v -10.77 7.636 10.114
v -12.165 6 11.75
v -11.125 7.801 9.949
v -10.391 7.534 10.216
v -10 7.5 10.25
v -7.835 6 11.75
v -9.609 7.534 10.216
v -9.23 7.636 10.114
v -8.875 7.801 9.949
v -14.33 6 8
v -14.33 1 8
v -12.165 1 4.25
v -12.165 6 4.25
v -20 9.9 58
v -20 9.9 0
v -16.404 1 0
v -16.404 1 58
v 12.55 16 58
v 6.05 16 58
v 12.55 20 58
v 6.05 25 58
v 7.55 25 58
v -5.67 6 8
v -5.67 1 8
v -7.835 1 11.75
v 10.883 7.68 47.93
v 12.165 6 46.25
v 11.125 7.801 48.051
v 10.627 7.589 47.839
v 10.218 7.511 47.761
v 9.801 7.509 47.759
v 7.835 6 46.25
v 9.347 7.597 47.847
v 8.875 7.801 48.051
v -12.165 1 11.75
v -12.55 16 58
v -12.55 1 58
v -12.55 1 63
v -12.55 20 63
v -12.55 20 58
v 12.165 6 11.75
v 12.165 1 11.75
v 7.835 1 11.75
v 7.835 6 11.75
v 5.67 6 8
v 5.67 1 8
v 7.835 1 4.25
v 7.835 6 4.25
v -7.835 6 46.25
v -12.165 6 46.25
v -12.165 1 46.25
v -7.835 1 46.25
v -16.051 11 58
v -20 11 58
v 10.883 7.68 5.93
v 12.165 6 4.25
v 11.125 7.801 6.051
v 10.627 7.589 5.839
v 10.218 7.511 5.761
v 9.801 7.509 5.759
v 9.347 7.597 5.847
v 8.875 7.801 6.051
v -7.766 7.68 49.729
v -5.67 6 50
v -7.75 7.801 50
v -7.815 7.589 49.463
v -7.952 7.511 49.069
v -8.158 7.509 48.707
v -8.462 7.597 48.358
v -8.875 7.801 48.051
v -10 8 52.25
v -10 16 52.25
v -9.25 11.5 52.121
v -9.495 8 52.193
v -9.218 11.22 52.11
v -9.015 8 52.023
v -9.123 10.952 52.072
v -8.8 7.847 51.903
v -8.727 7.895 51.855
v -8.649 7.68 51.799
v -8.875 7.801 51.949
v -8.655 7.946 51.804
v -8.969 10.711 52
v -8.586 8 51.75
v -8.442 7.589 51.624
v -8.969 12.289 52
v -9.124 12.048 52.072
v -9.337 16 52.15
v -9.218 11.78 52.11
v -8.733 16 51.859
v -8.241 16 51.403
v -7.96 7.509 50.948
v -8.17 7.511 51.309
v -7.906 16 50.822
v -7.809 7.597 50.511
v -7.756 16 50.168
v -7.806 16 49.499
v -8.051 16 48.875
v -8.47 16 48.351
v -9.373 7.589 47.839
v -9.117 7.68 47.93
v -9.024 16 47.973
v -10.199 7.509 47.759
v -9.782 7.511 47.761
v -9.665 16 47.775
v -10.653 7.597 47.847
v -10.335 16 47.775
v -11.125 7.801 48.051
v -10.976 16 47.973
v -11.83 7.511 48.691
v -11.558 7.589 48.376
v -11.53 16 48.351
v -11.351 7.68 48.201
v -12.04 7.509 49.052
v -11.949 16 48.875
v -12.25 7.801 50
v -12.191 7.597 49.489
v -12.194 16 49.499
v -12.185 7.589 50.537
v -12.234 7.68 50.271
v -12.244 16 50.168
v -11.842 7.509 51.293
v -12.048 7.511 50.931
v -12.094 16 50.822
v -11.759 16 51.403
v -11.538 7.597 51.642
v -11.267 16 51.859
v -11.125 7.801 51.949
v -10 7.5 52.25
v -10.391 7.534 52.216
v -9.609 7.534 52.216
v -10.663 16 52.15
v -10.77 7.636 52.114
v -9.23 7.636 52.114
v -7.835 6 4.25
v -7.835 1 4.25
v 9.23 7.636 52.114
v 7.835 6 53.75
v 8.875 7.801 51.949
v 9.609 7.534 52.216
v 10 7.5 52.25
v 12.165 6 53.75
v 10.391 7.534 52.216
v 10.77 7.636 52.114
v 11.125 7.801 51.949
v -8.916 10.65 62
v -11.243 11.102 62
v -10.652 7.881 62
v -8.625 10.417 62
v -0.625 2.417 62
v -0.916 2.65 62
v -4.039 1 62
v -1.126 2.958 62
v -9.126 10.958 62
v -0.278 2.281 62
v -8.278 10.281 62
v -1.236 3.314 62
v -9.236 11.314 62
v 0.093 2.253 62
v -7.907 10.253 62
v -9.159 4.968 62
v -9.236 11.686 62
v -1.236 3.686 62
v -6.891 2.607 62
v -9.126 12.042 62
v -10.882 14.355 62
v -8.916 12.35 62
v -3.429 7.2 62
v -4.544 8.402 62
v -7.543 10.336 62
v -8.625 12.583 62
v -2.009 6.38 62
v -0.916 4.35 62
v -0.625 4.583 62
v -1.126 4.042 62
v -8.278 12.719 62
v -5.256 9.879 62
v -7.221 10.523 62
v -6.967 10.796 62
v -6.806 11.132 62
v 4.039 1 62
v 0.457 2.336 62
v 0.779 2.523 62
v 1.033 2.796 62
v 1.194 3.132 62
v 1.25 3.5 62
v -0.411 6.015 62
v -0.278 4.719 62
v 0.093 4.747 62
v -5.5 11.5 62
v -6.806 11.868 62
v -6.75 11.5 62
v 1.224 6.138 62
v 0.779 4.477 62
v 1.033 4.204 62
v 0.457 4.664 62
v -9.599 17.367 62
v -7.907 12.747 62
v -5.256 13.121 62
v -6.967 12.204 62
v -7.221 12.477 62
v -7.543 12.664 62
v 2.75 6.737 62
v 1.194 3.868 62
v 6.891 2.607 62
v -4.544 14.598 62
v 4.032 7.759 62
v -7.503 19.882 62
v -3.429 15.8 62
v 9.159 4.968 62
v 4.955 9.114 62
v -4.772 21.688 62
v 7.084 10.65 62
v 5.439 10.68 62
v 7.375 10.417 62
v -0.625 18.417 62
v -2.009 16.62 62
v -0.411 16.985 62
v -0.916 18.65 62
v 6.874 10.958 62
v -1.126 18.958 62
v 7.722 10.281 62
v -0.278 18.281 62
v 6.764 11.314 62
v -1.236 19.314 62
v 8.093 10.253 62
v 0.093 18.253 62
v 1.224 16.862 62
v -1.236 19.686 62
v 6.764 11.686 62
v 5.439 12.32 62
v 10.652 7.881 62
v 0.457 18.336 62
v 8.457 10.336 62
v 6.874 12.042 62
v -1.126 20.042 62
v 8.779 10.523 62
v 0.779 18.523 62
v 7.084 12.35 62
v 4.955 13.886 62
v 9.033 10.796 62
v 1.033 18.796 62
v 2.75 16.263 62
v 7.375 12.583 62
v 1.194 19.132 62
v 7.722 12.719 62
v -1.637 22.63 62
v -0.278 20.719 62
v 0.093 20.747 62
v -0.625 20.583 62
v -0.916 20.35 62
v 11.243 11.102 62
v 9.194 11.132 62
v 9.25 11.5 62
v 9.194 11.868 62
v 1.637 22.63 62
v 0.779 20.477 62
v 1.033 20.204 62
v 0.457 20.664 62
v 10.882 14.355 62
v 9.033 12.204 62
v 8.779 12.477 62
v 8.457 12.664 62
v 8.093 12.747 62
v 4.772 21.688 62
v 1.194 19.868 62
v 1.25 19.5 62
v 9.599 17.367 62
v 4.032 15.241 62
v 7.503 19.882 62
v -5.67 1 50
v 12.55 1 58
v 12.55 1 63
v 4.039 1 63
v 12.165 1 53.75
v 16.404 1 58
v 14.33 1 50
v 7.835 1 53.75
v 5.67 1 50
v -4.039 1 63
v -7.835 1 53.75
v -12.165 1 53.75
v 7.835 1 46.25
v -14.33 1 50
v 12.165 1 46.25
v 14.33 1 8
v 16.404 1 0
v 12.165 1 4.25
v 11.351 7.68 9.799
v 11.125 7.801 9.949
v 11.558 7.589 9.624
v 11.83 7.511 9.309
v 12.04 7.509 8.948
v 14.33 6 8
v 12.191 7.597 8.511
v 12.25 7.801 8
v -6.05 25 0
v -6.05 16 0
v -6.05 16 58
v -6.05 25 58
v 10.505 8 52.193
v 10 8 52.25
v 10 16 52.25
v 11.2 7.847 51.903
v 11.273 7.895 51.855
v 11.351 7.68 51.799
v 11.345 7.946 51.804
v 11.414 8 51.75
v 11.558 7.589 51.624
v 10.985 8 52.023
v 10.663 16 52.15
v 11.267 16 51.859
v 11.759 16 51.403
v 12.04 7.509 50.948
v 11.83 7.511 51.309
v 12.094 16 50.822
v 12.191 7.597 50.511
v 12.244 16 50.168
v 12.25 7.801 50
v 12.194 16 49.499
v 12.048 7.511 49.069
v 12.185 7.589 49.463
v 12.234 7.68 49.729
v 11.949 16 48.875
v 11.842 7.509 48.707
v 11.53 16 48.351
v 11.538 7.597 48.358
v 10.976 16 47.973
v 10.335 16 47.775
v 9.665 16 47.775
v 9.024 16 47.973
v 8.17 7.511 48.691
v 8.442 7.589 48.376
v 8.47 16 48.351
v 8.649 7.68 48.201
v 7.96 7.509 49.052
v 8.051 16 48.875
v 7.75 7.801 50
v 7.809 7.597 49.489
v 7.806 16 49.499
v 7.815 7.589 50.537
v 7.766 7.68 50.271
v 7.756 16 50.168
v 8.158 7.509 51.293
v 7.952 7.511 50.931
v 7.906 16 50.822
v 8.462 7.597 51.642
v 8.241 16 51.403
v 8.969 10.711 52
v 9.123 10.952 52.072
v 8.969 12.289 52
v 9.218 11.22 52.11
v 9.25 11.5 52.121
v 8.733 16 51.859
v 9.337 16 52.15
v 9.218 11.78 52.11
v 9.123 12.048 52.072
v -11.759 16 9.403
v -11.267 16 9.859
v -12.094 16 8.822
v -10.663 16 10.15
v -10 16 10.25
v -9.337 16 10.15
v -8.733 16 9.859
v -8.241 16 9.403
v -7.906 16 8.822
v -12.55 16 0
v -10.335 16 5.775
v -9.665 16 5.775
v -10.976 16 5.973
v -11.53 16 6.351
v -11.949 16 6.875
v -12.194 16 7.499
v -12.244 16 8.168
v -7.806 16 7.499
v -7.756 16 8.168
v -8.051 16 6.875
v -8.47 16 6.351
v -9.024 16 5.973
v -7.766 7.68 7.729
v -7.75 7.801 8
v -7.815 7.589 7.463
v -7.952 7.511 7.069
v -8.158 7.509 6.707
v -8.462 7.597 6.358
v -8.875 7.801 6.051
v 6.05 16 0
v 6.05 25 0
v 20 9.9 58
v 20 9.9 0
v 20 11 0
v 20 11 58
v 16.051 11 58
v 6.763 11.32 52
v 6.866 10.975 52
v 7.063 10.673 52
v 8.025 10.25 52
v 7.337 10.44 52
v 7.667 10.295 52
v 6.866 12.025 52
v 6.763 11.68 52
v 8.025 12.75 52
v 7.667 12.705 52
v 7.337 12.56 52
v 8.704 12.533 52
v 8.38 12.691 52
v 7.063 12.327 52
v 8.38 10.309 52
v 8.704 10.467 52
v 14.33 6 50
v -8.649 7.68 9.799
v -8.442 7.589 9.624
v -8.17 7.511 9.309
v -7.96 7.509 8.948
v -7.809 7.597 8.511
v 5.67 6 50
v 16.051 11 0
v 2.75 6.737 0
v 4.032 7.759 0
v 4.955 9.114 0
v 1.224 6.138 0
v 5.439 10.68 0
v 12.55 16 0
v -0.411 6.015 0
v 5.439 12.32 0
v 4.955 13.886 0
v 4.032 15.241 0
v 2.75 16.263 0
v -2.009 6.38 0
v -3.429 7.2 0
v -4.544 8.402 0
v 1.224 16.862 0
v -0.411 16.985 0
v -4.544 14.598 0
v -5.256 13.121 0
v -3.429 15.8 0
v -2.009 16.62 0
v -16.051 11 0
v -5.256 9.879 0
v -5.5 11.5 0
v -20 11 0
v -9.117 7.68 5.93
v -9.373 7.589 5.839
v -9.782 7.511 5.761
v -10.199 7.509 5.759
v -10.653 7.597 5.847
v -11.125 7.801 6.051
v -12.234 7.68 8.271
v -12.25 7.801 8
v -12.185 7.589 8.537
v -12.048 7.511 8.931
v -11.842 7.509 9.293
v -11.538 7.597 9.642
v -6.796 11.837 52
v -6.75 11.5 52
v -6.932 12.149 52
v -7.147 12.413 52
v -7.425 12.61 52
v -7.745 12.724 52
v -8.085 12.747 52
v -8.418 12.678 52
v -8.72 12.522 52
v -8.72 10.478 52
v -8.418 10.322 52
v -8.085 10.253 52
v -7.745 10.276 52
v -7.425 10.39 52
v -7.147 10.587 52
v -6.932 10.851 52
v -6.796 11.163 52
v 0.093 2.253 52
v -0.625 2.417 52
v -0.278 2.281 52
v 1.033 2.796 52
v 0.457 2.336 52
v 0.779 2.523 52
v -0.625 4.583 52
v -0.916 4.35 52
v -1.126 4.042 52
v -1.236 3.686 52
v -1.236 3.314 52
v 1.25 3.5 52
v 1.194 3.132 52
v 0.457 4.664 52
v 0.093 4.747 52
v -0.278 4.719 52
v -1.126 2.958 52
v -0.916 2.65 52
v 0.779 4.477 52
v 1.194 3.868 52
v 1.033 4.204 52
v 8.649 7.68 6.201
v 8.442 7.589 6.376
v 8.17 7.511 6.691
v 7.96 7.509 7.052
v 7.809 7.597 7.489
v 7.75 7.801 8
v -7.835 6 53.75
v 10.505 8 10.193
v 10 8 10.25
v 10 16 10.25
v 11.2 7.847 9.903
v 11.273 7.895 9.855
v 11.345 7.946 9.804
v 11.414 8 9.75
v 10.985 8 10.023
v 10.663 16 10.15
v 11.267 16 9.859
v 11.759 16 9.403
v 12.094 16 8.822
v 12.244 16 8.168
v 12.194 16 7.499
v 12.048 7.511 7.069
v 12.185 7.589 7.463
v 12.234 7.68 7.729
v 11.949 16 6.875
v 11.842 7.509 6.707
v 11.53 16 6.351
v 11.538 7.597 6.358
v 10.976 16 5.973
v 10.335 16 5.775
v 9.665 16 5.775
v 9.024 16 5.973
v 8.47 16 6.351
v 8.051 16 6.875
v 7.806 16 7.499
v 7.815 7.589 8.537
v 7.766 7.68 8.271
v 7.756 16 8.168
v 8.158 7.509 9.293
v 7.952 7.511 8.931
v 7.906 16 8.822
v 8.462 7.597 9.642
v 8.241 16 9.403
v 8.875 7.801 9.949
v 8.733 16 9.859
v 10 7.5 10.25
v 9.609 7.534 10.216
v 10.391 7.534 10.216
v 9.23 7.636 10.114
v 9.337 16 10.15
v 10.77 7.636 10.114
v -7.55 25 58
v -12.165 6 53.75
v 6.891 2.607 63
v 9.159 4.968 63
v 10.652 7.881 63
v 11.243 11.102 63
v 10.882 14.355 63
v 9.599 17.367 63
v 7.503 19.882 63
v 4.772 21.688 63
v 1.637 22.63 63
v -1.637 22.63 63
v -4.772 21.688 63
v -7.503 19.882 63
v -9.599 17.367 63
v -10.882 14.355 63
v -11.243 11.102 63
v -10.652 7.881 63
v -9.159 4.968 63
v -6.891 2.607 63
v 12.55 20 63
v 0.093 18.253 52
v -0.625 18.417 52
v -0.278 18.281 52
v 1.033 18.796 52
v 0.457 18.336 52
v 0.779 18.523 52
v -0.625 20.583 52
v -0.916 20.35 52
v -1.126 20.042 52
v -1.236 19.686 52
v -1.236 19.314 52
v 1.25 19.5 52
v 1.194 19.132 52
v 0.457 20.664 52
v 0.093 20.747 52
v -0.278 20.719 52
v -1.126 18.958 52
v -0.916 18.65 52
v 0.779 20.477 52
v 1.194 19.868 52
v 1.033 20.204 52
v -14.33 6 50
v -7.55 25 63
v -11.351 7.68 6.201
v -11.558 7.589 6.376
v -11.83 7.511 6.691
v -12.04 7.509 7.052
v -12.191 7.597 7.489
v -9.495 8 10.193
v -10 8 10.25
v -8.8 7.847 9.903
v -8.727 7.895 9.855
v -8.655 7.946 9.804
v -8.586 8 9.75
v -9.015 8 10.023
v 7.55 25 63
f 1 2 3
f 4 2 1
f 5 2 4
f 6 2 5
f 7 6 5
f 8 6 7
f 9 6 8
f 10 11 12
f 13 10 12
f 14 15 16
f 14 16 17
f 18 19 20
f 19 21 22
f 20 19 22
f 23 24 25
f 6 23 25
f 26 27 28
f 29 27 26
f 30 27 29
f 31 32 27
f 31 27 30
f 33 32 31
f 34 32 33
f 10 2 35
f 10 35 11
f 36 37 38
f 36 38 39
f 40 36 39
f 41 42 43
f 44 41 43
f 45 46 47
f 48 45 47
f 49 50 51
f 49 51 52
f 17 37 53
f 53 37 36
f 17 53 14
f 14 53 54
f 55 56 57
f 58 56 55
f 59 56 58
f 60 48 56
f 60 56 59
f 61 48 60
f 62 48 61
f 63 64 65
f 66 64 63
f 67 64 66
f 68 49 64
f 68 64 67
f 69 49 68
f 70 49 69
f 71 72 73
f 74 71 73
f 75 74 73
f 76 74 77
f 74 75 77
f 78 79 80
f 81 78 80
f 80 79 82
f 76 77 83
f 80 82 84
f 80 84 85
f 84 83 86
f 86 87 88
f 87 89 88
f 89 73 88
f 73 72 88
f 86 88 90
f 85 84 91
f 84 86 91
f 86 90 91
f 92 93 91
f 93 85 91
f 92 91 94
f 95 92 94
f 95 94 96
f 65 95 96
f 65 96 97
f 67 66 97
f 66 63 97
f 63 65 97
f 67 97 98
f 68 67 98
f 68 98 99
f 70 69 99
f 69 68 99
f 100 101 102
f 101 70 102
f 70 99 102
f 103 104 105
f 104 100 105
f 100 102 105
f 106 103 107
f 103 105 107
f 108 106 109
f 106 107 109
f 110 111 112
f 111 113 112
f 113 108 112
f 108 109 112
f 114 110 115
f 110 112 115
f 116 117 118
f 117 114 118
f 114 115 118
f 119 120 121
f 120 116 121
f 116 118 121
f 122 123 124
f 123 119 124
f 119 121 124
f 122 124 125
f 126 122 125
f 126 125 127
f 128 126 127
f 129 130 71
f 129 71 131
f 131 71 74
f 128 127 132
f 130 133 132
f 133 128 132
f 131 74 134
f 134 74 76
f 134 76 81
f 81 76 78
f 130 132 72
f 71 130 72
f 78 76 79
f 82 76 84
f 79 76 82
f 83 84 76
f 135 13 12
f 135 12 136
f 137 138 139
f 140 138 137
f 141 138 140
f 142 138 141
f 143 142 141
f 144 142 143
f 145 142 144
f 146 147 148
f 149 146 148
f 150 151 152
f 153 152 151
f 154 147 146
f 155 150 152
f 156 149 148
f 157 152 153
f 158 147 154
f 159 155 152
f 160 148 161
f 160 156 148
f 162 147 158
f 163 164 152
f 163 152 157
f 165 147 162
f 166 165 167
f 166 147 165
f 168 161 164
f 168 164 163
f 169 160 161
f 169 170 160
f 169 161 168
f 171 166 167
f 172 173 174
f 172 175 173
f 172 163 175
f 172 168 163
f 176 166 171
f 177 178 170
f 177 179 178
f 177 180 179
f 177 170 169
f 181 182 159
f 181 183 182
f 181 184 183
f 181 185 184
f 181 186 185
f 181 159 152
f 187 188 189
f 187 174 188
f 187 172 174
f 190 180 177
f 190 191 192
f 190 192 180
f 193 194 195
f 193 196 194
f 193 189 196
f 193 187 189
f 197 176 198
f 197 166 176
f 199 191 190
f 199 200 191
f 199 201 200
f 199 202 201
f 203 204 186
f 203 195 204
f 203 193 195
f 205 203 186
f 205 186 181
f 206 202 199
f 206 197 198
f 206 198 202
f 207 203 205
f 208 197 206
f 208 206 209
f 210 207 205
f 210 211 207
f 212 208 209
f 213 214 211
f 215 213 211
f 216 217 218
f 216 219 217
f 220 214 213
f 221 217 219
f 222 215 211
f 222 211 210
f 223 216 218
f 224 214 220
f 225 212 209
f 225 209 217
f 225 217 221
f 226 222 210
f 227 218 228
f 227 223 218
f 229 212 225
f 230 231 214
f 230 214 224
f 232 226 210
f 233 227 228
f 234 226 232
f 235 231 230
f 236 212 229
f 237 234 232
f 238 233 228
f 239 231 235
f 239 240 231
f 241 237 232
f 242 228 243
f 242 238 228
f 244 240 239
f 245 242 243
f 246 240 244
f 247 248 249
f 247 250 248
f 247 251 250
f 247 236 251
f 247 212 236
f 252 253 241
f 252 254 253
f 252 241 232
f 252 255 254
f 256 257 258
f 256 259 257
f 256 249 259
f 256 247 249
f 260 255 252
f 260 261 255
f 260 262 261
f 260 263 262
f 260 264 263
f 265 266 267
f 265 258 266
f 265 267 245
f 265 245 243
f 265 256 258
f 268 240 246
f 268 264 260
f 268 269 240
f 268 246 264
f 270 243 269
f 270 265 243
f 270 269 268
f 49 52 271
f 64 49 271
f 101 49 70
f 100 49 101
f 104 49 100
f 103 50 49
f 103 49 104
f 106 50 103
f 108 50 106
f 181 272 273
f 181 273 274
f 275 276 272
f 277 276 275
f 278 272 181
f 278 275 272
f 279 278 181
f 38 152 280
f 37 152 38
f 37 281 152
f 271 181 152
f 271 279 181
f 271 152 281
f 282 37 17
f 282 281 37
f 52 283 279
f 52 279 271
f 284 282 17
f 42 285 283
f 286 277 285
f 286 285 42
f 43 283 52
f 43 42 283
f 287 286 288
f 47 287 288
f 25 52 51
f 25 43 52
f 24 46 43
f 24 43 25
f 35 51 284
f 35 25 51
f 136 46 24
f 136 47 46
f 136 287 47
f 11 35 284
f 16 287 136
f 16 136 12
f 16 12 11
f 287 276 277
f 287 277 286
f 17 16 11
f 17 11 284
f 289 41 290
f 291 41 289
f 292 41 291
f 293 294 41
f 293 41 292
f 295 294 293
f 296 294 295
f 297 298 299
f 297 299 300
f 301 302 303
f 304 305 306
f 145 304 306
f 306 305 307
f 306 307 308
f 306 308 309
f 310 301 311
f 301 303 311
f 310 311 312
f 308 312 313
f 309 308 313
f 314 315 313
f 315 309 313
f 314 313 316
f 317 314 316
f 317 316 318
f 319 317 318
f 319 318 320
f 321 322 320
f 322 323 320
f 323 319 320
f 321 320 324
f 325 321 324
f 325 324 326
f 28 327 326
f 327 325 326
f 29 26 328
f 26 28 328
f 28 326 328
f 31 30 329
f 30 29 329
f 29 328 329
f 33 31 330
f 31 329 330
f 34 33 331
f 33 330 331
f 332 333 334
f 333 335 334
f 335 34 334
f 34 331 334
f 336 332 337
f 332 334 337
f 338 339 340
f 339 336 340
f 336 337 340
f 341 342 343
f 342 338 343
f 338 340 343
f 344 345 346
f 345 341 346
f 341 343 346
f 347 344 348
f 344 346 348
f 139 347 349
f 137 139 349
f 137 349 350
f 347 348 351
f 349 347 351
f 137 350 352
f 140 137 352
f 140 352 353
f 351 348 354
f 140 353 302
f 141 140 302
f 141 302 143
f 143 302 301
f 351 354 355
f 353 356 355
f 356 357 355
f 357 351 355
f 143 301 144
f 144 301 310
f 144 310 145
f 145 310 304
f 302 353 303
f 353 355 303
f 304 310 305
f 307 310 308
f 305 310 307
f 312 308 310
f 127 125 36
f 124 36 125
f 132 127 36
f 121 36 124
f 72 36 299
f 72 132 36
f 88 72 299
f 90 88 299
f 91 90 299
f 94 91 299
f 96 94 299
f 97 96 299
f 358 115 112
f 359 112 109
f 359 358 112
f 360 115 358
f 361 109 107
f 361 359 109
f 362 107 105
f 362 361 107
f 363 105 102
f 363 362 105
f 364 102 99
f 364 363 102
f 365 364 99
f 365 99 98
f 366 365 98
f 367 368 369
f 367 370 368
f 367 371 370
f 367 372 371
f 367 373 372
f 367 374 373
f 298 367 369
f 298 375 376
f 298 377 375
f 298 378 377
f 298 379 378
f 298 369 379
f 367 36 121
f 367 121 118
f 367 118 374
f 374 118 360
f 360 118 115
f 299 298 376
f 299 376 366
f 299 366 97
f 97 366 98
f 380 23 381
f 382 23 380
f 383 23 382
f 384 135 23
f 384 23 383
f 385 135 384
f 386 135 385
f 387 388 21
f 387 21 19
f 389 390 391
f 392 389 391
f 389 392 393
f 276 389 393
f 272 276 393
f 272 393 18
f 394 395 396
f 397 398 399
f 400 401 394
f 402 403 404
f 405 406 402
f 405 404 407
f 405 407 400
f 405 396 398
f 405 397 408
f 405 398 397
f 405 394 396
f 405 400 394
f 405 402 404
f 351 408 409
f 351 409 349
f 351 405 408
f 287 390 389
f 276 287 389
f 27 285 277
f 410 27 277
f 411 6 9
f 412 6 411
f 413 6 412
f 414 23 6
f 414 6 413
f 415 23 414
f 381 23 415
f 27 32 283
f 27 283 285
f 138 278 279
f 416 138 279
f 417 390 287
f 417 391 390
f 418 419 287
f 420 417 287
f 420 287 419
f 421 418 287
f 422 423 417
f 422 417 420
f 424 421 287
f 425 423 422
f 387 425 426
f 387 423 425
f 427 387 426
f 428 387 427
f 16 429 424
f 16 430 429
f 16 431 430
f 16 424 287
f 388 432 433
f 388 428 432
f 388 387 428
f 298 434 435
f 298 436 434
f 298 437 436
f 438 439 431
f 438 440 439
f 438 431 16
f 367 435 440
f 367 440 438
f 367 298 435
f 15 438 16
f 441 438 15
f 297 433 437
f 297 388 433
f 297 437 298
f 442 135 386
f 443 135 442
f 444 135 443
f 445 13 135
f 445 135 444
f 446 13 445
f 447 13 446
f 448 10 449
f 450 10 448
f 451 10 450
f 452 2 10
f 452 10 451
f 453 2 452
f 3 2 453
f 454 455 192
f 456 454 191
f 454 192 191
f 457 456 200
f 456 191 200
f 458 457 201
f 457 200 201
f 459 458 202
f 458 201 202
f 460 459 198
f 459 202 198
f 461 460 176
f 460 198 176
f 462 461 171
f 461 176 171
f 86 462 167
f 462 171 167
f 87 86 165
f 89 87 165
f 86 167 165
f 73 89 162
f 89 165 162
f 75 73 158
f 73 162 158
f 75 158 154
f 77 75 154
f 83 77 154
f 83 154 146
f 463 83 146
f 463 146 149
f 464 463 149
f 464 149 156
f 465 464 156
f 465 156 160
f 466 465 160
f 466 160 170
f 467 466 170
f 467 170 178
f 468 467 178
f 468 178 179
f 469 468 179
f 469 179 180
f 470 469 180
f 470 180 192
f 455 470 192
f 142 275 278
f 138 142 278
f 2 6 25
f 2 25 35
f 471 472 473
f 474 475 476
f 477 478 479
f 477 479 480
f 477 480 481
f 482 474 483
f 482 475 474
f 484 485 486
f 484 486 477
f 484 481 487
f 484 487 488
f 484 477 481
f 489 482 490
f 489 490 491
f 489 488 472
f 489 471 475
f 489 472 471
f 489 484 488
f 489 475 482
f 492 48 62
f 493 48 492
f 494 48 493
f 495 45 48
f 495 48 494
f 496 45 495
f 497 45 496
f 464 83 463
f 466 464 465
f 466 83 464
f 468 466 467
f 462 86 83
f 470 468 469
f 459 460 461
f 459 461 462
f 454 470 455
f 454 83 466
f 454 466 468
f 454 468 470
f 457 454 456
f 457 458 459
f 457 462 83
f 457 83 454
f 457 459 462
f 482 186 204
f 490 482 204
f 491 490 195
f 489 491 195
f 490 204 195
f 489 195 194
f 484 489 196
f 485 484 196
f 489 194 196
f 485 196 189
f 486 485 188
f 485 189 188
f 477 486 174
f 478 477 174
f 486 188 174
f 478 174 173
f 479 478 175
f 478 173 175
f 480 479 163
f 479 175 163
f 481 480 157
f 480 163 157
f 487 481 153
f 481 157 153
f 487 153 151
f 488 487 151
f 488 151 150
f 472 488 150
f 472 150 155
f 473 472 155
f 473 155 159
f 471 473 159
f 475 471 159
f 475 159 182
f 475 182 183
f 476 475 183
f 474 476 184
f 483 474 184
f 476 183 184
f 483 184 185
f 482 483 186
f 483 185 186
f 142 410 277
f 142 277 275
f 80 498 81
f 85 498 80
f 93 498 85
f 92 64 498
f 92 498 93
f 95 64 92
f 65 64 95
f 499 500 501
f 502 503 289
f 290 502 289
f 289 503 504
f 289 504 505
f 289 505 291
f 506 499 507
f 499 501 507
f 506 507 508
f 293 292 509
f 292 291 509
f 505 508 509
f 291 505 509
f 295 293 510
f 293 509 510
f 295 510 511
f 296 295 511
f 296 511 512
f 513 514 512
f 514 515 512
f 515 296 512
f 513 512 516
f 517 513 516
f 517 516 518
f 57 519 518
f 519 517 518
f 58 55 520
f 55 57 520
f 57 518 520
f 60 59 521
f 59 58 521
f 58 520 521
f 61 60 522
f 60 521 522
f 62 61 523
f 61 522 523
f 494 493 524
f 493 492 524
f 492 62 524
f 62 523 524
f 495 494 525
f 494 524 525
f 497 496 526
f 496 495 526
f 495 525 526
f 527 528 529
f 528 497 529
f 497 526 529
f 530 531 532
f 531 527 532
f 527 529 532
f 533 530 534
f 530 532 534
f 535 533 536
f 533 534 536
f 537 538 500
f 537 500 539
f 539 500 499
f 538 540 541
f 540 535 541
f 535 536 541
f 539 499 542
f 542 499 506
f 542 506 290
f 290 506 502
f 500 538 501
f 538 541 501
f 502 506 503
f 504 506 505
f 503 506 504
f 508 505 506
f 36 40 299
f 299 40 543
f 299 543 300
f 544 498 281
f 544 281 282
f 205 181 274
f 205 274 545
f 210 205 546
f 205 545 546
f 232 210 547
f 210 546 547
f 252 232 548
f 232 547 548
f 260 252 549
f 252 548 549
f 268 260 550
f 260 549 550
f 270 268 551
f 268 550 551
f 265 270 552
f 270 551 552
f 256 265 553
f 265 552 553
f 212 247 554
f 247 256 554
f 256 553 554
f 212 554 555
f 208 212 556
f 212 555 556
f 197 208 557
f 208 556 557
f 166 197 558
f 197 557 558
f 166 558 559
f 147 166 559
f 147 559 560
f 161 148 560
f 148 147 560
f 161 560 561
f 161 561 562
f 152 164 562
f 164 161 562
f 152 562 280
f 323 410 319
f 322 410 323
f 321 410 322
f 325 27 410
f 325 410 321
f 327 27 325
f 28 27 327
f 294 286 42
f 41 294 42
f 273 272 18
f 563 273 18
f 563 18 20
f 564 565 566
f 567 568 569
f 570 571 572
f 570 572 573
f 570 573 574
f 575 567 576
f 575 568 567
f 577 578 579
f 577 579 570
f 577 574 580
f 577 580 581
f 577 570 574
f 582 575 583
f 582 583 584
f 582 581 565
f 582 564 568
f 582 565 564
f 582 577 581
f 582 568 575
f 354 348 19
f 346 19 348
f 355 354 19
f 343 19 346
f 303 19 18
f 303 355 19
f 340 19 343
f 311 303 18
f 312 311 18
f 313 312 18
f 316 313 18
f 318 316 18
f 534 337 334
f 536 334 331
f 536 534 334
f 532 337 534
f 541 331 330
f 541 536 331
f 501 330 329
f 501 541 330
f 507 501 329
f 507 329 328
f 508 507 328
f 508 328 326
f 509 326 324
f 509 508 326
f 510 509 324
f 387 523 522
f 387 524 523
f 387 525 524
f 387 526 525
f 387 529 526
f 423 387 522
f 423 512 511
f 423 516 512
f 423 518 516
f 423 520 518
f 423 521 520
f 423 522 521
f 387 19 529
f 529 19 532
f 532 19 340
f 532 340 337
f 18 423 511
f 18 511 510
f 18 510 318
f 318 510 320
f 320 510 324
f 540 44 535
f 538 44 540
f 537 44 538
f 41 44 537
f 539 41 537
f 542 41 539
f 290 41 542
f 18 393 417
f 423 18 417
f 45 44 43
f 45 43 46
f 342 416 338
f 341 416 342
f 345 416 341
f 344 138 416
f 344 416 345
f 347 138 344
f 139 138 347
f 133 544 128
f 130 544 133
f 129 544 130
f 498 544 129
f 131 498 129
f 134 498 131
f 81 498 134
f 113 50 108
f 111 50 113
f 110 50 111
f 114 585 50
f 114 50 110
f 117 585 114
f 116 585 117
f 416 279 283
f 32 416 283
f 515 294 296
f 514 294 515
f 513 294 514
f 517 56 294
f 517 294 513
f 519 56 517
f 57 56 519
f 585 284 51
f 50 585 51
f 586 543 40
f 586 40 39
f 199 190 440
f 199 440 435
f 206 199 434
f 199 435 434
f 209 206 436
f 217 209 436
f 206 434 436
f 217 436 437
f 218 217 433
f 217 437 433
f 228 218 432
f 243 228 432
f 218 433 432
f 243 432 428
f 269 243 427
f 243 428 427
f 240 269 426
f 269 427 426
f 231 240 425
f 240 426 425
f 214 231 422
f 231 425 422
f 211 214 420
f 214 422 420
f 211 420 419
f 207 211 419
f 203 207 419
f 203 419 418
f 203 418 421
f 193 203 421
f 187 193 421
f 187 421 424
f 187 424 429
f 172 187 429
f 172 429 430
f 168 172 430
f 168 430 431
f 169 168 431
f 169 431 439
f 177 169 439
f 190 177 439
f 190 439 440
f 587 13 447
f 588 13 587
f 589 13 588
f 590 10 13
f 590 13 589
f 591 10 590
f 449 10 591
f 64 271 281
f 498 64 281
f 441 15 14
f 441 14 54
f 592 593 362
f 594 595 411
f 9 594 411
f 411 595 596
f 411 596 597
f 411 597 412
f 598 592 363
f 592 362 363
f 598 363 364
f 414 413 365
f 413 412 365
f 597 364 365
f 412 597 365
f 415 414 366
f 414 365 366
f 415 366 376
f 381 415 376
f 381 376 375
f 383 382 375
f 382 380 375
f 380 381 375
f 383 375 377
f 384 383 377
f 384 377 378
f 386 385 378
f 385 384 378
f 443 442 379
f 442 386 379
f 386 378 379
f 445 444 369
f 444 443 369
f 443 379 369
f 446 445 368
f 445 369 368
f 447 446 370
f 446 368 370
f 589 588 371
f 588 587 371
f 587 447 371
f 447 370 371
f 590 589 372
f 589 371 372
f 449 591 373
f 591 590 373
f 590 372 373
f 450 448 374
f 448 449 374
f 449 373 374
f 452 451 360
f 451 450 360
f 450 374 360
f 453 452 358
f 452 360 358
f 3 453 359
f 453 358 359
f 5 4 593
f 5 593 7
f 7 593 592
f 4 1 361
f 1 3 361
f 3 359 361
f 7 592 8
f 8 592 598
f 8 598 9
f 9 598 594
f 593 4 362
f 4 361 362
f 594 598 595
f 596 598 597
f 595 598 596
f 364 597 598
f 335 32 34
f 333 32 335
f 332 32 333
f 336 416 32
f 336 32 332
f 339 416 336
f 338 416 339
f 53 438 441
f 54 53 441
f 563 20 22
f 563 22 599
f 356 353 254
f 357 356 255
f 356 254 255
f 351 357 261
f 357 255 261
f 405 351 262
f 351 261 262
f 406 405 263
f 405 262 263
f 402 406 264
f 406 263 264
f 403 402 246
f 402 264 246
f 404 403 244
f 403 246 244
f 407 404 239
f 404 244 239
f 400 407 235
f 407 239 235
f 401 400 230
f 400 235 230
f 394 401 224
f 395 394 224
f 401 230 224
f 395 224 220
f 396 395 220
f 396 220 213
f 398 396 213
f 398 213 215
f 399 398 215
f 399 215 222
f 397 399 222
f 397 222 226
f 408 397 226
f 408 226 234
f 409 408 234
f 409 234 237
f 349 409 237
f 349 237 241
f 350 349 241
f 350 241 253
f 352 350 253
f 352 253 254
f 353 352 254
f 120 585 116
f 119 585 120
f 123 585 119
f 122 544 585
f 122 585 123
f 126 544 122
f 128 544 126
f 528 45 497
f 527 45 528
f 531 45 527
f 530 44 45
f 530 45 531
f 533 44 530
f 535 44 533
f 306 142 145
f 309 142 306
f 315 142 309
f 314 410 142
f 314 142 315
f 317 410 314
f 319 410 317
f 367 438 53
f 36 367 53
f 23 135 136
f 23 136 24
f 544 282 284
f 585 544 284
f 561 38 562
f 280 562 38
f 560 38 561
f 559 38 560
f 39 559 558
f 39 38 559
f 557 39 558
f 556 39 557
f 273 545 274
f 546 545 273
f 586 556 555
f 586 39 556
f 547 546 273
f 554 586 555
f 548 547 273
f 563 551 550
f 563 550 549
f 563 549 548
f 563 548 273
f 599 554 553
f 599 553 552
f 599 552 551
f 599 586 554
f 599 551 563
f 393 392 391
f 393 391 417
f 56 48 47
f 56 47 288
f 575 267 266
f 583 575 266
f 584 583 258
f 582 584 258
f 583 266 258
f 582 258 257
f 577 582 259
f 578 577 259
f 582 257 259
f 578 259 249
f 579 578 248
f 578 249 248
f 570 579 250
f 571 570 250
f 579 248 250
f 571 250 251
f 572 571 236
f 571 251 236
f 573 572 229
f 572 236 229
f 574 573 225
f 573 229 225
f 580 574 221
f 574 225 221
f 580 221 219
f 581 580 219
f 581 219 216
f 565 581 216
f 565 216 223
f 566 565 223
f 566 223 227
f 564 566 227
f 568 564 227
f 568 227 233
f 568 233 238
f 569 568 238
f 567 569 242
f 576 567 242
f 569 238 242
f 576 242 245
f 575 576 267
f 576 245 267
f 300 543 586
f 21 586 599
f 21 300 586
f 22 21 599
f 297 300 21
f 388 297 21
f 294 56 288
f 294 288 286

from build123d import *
from OCP.BRepFilletAPI import BRepFilletAPI_MakeChamfer

# Parameters (mm, degrees)
BOSS_EXTRUDE1_DEPTH = 58
SKETCH11_W          = 40
SKETCH11_H          = 11
BOSS_EXTRUDE3_DEPTH = 58
SKETCH5_W           = 25.1
SKETCH5_H           = 25
BOSS_EXTRUDE2_DEPTH = 5
SKETCH6_R           = 5.5
CUT_EXTRUDE4_DEPTH  = 63
SKETCH7_R           = 11.25
CUT_EXTRUDE5_DEPTH  = 1
SKETCH10_R          = 2.25
CUT_EXTRUDE7_DEPTH  = 16
CHAMFER2_SIZE       = 5
SKETCH9_R           = 1.25
CUT_EXTRUDE8_DEPTH  = 10
CUT_EXTRUDE9_DEPTH  = 8
CHAMFER4_SIZE       = 2
CHAMFER6_SIZE       = 5
CHAMFER6_SIZE_2     = 3.501037691
CHAMFER7_SIZE       = 4
CHAMFER7_SIZE2      = 9.900347414
CHAMFER8_SIZE       = 4
CHAMFER8_SIZE2      = 9.900347414
SKETCH13_W          = 40
SKETCH13_H          = 2
CUT_EXTRUDE10_DEPTH = 67


# Some blends are built 0.0001 mm under size
with BuildPart() as part:
    # Sketch1 → Boss-Extrude1 (new body)
    with BuildSketch(Plane.XY):
        Polygon((-6.05, 25), (6.05, 25), (6.05, 16), (12.55, 16), (12.55, 0), (-12.55, 0), (-12.55, 16), (-6.05, 16), align=None)
    extrude(amount=BOSS_EXTRUDE1_DEPTH)

    # Sketch11 → Boss-Extrude3 (add)
    with BuildSketch(Plane(origin=(0, 0, 0), x_dir=(-1, 0, 0), z_dir=(0, 0, -1))):
        with Locations((0, 5.5)):
            Rectangle(SKETCH11_W, SKETCH11_H)
    extrude(amount=-BOSS_EXTRUDE3_DEPTH)

    # Sketch5 → Boss-Extrude2 (add)
    with BuildSketch(Plane.XY.offset(58)):
        with Locations((0, 12.5)):
            Rectangle(SKETCH5_W, SKETCH5_H)
    extrude(amount=BOSS_EXTRUDE2_DEPTH)

    # Sketch6 → Cut-Extrude4 (cut)
    with BuildSketch(Plane(origin=(0, 0, 0), x_dir=(-1, 0, 0), z_dir=(0, 0, -1))):
        with Locations((0, 11.5)):
            Circle(SKETCH6_R)
    extrude(amount=-CUT_EXTRUDE4_DEPTH, mode=Mode.SUBTRACT)

    # Sketch7 → Cut-Extrude5 (cut)
    with BuildSketch(Plane.XY.offset(63)):
        with Locations((0, 11.5)):
            Circle(SKETCH7_R)
    extrude(amount=-CUT_EXTRUDE5_DEPTH, mode=Mode.SUBTRACT)

    # Sketch10 → Cut-Extrude7 (cut)
    with BuildSketch(Plane(origin=(0, 16, 0), x_dir=(1, 0, 0), z_dir=(0, 1, 0))):
        with Locations(Location((-10, -8, 0), (0, 0, 270))):
            Circle(SKETCH10_R)
        with Locations(Location((-10, -50, 0), (0, 0, 270))):
            Circle(SKETCH10_R)
        with Locations(Location((10, -50, 0), (0, 0, 270))):
            Circle(SKETCH10_R)
        with Locations(Location((10, -8, 0), (0, 0, 270))):
            Circle(SKETCH10_R)
    extrude(amount=-CUT_EXTRUDE7_DEPTH, mode=Mode.SUBTRACT)

    # Chamfer2
    chamfer2_edges = [part.edges().sort_by_distance(p)[0] for p in [
        (-12.55, 25, 60.5),
        (12.55, 25, 60.5),
    ]]
    chamfer(chamfer2_edges, length=CHAMFER2_SIZE)

    # Sketch9 → Cut-Extrude8 (cut)
    with BuildSketch(Plane.XY.offset(62)):
        with Locations((-8, 11.5)):
            Circle(SKETCH9_R)
        with Locations((8, 11.5)):
            Circle(SKETCH9_R)
        with Locations((0, 3.5)):
            Circle(SKETCH9_R)
        with Locations((0, 19.5)):
            Circle(SKETCH9_R)
    extrude(amount=-CUT_EXTRUDE8_DEPTH, mode=Mode.SUBTRACT)

    # Sketch12 → Cut-Extrude9 (cut)
    with BuildSketch(Plane.XZ):
        Polygon((12.165063509, 46.25), (14.330127019, 50), (12.165063509, 53.75), (7.834936491, 53.75), (5.669872981, 50), (7.834936491, 46.25), align=None)
        Polygon((-7.834936491, 46.25), (-5.669872981, 50), (-7.834936491, 53.75), (-12.165063509, 53.75), (-14.330127019, 50), (-12.165063509, 46.25), align=None)
        Polygon((-7.834936491, 4.25), (-5.669872981, 8), (-7.834936491, 11.75), (-12.165063509, 11.75), (-14.330127019, 8), (-12.165063509, 4.25), align=None)
        Polygon((12.165063509, 4.25), (14.330127019, 8), (12.165063509, 11.75), (7.834936491, 11.75), (5.669872981, 8), (7.834936491, 4.25), align=None)
    extrude(amount=-CUT_EXTRUDE9_DEPTH, mode=Mode.SUBTRACT)

    # Chamfer4
    # the kernel refuses this chamfer: 2 mm, written as the material it adds along each edge
    with BuildSketch(Plane(origin=(-16.901810007, 8, 12.454285596), x_dir=(-0.023812127644090745, -0.9996219169112968, -0.013747938305293514), z_dir=(0.49999999999999983, 0, -0.8660254037844388))) as chamfer4_piece_1_section:
        Polygon((CHAMFER4_SIZE * 0.999621916911, -CHAMFER4_SIZE * 0.0274958766106), (-CHAMFER4_SIZE * 0.0274958766106, -CHAMFER4_SIZE * 0.999621916911), (0, 0), align=None)
    chamfer4_piece_1 = extrude(amount=14.616858971, mode=Mode.PRIVATE)
    chamfer4_piece_1 = chamfer4_piece_1 - Plane(origin=(-10, 7.348778849, 8), x_dir=(0, 0, 1), z_dir=(0, 1, 0)) * Cylinder(2.25, 38, mode=Mode.PRIVATE)
    chamfer4_piece_1 = split(chamfer4_piece_1, bisect_by=Plane(origin=(-12.643492577, 7.348778849, 4.25), z_dir=(0, 0, 1)), keep=Keep.TOP, mode=Mode.PRIVATE)
    add(chamfer4_piece_1)
    with BuildSketch(Plane(origin=(-9.593380521, 8, 16.204285596), x_dir=(-0.02381212764408972, -0.9996219169112968, 0.013747938305292926), z_dir=(-0.49999999999999994, 0, -0.8660254037844387))) as chamfer4_piece_2_section:
        Polygon((CHAMFER4_SIZE * 0.999621916911, -CHAMFER4_SIZE * 0.0274958766106), (-CHAMFER4_SIZE * 0.0274958766106, -CHAMFER4_SIZE * 0.999621916911), (0, 0), align=None)
    chamfer4_piece_2 = extrude(amount=14.616858971, mode=Mode.PRIVATE)
    chamfer4_piece_2 = chamfer4_piece_2 - Plane(origin=(-10, 7.348778849, 8), x_dir=(0, 0, 1), z_dir=(0, 1, 0)) * Cylinder(2.25, 38, mode=Mode.PRIVATE)
    add(chamfer4_piece_2)
    with BuildSketch(Plane(origin=(-2.691570515, 8, 11.75), x_dir=(0, -0.9996219169112968, 0.027495876610586487), z_dir=(-1, 0, 0))) as chamfer4_piece_3_section:
        Polygon((CHAMFER4_SIZE * 0.999621916911, -CHAMFER4_SIZE * 0.0274958766106), (-CHAMFER4_SIZE * 0.0274958766106, -CHAMFER4_SIZE * 0.999621916911), (0, 0), align=None)
    chamfer4_piece_3 = extrude(amount=14.616858971, mode=Mode.PRIVATE)
    chamfer4_piece_3 = chamfer4_piece_3 - Plane(origin=(-10, 7.348778849, 8), x_dir=(0, 0, 1), z_dir=(0, 1, 0)) * Cylinder(2.25, 38, mode=Mode.PRIVATE)
    chamfer4_piece_3 = split(chamfer4_piece_3, bisect_by=Plane(origin=(-8.074151024, 7.348778849, 12.164331727), z_dir=(-0.8660254037844387, 0, -0.49999999999999994)), keep=Keep.TOP, mode=Mode.PRIVATE)
    add(chamfer4_piece_3)
    with BuildSketch(Plane(origin=(-3.098189993, 8, 3.545714404), x_dir=(0.023812127644090235, -0.9996219169112968, 0.01374793830529322), z_dir=(-0.49999999999999994, 0, 0.8660254037844387))) as chamfer4_piece_4_section:
        Polygon((CHAMFER4_SIZE * 0.999621916911, -CHAMFER4_SIZE * 0.0274958766106), (-CHAMFER4_SIZE * 0.0274958766106, -CHAMFER4_SIZE * 0.999621916911), (0, 0), align=None)
    chamfer4_piece_4 = extrude(amount=14.616858971, mode=Mode.PRIVATE)
    chamfer4_piece_4 = chamfer4_piece_4 - Plane(origin=(-10, 7.348778849, 8), x_dir=(0, 0, 1), z_dir=(0, 1, 0)) * Cylinder(2.25, 38, mode=Mode.PRIVATE)
    chamfer4_piece_4 = split(chamfer4_piece_4, bisect_by=Plane(origin=(-5.430658447, 7.348778849, 8.414331727), z_dir=(-0.8660254037844387, 0, 0.4999999999999999)), keep=Keep.TOP, mode=Mode.PRIVATE)
    add(chamfer4_piece_4)
    with BuildSketch(Plane(origin=(-10.406619479, 8, -0.204285596), x_dir=(0.023812127644089884, -0.9996219169112968, -0.013747938305293021), z_dir=(0.4999999999999999, 0, 0.8660254037844387))) as chamfer4_piece_5_section:
        Polygon((CHAMFER4_SIZE * 0.999621916911, -CHAMFER4_SIZE * 0.0274958766106), (-CHAMFER4_SIZE * 0.0274958766106, -CHAMFER4_SIZE * 0.999621916911), (0, 0), align=None)
    chamfer4_piece_5 = extrude(amount=14.616858971, mode=Mode.PRIVATE)
    chamfer4_piece_5 = chamfer4_piece_5 - Plane(origin=(-10, 7.348778849, 8), x_dir=(0, 0, 1), z_dir=(0, 1, 0)) * Cylinder(2.25, 38, mode=Mode.PRIVATE)
    chamfer4_piece_5 = split(chamfer4_piece_5, bisect_by=Plane(origin=(-5.430658447, 7.348778849, 7.585668273), z_dir=(-0.8660254037844387, 0, -0.49999999999999994)), keep=Keep.TOP, mode=Mode.PRIVATE)
    chamfer4_piece_5 = split(chamfer4_piece_5, bisect_by=Plane(origin=(-7.356507423, 7.348778849, 4.25), z_dir=(0, 0, 1)), keep=Keep.TOP, mode=Mode.PRIVATE)
    add(chamfer4_piece_5)
    with BuildSketch(Plane(origin=(-17.308429485, 8, 4.25), x_dir=(0, -0.9996219169112968, -0.027495876610586487), z_dir=(1, 0, 0))) as chamfer4_piece_6_section:
        Polygon((CHAMFER4_SIZE * 0.999621916911, -CHAMFER4_SIZE * 0.0274958766106), (-CHAMFER4_SIZE * 0.0274958766106, -CHAMFER4_SIZE * 0.999621916911), (0, 0), align=None)
    chamfer4_piece_6 = extrude(amount=14.616858971, mode=Mode.PRIVATE)
    chamfer4_piece_6 = chamfer4_piece_6 - Plane(origin=(-10, 7.348778849, 8), x_dir=(0, 0, 1), z_dir=(0, 1, 0)) * Cylinder(2.25, 38, mode=Mode.PRIVATE)
    chamfer4_piece_6 = split(chamfer4_piece_6, bisect_by=Plane(origin=(-8.074151024, 7.348778849, 3.835668273), z_dir=(-0.8660254037844387, 0, 0.4999999999999999)), keep=Keep.TOP, mode=Mode.PRIVATE)
    add(chamfer4_piece_6)
    with BuildSketch(Plane(origin=(3.098189993, 8, 12.454285596), x_dir=(-0.023812127644090207, -0.9996219169112968, -0.013747938305293207), z_dir=(0.49999999999999994, 0, -0.8660254037844387))) as chamfer4_piece_7_section:
        Polygon((CHAMFER4_SIZE * 0.999621916911, -CHAMFER4_SIZE * 0.0274958766106), (-CHAMFER4_SIZE * 0.0274958766106, -CHAMFER4_SIZE * 0.999621916911), (0, 0), align=None)
    chamfer4_piece_7 = extrude(amount=14.616858971, mode=Mode.PRIVATE)
    chamfer4_piece_7 = split(chamfer4_piece_7, bisect_by=Plane(origin=(5.430658447, 7.348778849, 7.585668273), z_dir=(0.8660254037844387, 0, -0.49999999999999994)), keep=Keep.TOP, mode=Mode.PRIVATE)
    chamfer4_piece_7 = split(chamfer4_piece_7, bisect_by=Plane(origin=(7.356507423, 7.348778849, 4.25), z_dir=(0, 0, 1)), keep=Keep.TOP, mode=Mode.PRIVATE)
    chamfer4_piece_7 = chamfer4_piece_7 - Plane(origin=(10, 7.348778849, 8), x_dir=(0, 0, 1), z_dir=(0, 1, 0)) * Cylinder(2.25, 38, mode=Mode.PRIVATE)
    add(chamfer4_piece_7)
    with BuildSketch(Plane(origin=(10.406619479, 8, 16.204285596), x_dir=(-0.023812127644090367, -0.9996219169112968, 0.0137479383052933), z_dir=(-0.49999999999999994, 0, -0.8660254037844387))) as chamfer4_piece_8_section:
        Polygon((CHAMFER4_SIZE * 0.999621916911, -CHAMFER4_SIZE * 0.0274958766106), (-CHAMFER4_SIZE * 0.0274958766106, -CHAMFER4_SIZE * 0.999621916911), (0, 0), align=None)
    chamfer4_piece_8 = extrude(amount=14.616858971, mode=Mode.PRIVATE)
    chamfer4_piece_8 = split(chamfer4_piece_8, bisect_by=Plane(origin=(5.430658447, 7.348778849, 8.414331727), z_dir=(0.8660254037844387, 0, 0.49999999999999994)), keep=Keep.TOP, mode=Mode.PRIVATE)
    chamfer4_piece_8 = chamfer4_piece_8 - Plane(origin=(10, 7.348778849, 8), x_dir=(0, 0, 1), z_dir=(0, 1, 0)) * Cylinder(2.25, 38, mode=Mode.PRIVATE)
    add(chamfer4_piece_8)
    with BuildSketch(Plane(origin=(17.308429485, 8, 11.75), x_dir=(0, -0.9996219169112968, 0.027495876610586487), z_dir=(-1, 0, 0))) as chamfer4_piece_9_section:
        Polygon((CHAMFER4_SIZE * 0.999621916911, -CHAMFER4_SIZE * 0.0274958766106), (-CHAMFER4_SIZE * 0.0274958766106, -CHAMFER4_SIZE * 0.999621916911), (0, 0), align=None)
    chamfer4_piece_9 = extrude(amount=14.616858971, mode=Mode.PRIVATE)
    chamfer4_piece_9 = split(chamfer4_piece_9, bisect_by=Plane(origin=(8.074151024, 7.348778849, 12.164331727), z_dir=(0.8660254037844387, 0, -0.49999999999999994)), keep=Keep.TOP, mode=Mode.PRIVATE)
    chamfer4_piece_9 = chamfer4_piece_9 - Plane(origin=(10, 7.348778849, 8), x_dir=(0, 0, 1), z_dir=(0, 1, 0)) * Cylinder(2.25, 38, mode=Mode.PRIVATE)
    add(chamfer4_piece_9)
    with BuildSketch(Plane(origin=(16.901810007, 8, 3.545714404), x_dir=(0.02381212764409056, -0.9996219169112968, 0.013747938305293401), z_dir=(-0.49999999999999967, 0, 0.8660254037844388))) as chamfer4_piece_10_section:
        Polygon((CHAMFER4_SIZE * 0.999621916911, -CHAMFER4_SIZE * 0.0274958766106), (-CHAMFER4_SIZE * 0.0274958766106, -CHAMFER4_SIZE * 0.999621916911), (0, 0), align=None)
    chamfer4_piece_10 = extrude(amount=14.616858971, mode=Mode.PRIVATE)
    chamfer4_piece_10 = chamfer4_piece_10 - Plane(origin=(10, 7.348778849, 8), x_dir=(0, 0, 1), z_dir=(0, 1, 0)) * Cylinder(2.25, 38, mode=Mode.PRIVATE)
    add(chamfer4_piece_10)
    with BuildSketch(Plane(origin=(9.593380521, 8, -0.204285596), x_dir=(0.02381212764408988, -0.9996219169112968, -0.01374793830529301), z_dir=(0.49999999999999967, 0, 0.8660254037844388))) as chamfer4_piece_11_section:
        Polygon((CHAMFER4_SIZE * 0.999621916911, -CHAMFER4_SIZE * 0.0274958766106), (-CHAMFER4_SIZE * 0.0274958766106, -CHAMFER4_SIZE * 0.999621916911), (0, 0), align=None)
    chamfer4_piece_11 = extrude(amount=14.616858971, mode=Mode.PRIVATE)
    chamfer4_piece_11 = split(chamfer4_piece_11, bisect_by=Plane(origin=(12.643492577, 7.348778849, 4.25), z_dir=(0, 0, 1)), keep=Keep.TOP, mode=Mode.PRIVATE)
    chamfer4_piece_11 = chamfer4_piece_11 - Plane(origin=(10, 7.348778849, 8), x_dir=(0, 0, 1), z_dir=(0, 1, 0)) * Cylinder(2.25, 38, mode=Mode.PRIVATE)
    add(chamfer4_piece_11)
    with BuildSketch(Plane(origin=(2.691570515, 8, 4.25), x_dir=(0, -0.9996219169112968, -0.027495876610586487), z_dir=(1, 0, 0))) as chamfer4_piece_12_section:
        Polygon((CHAMFER4_SIZE * 0.999621916911, -CHAMFER4_SIZE * 0.0274958766106), (-CHAMFER4_SIZE * 0.0274958766106, -CHAMFER4_SIZE * 0.999621916911), (0, 0), align=None)
    chamfer4_piece_12 = extrude(amount=14.616858971, mode=Mode.PRIVATE)
    chamfer4_piece_12 = split(chamfer4_piece_12, bisect_by=Plane(origin=(8.074151024, 7.348778849, 3.835668273), z_dir=(0.8660254037844387, 0, 0.49999999999999994)), keep=Keep.TOP, mode=Mode.PRIVATE)
    chamfer4_piece_12 = chamfer4_piece_12 - Plane(origin=(10, 7.348778849, 8), x_dir=(0, 0, 1), z_dir=(0, 1, 0)) * Cylinder(2.25, 38, mode=Mode.PRIVATE)
    add(chamfer4_piece_12)
    with BuildSketch(Plane(origin=(3.098189993, 8, 54.454285596), x_dir=(-0.02381212764409011, -0.9996219169112968, -0.013747938305293146), z_dir=(0.4999999999999998, 0, -0.8660254037844388))) as chamfer4_piece_13_section:
        Polygon((CHAMFER4_SIZE * 0.999621916911, -CHAMFER4_SIZE * 0.0274958766106), (-CHAMFER4_SIZE * 0.0274958766106, -CHAMFER4_SIZE * 0.999621916911), (0, 0), align=None)
    chamfer4_piece_13 = extrude(amount=14.616858971, mode=Mode.PRIVATE)
    chamfer4_piece_13 = split(chamfer4_piece_13, bisect_by=Plane(origin=(5.430658447, 7.348778849, 49.585668273), z_dir=(0.8660254037844388, 0, -0.49999999999999967)), keep=Keep.TOP, mode=Mode.PRIVATE)
    chamfer4_piece_13 = chamfer4_piece_13 - Plane(origin=(10, 7.348778849, 50), x_dir=(0, 0, 1), z_dir=(0, 1, 0)) * Cylinder(2.25, 38, mode=Mode.PRIVATE)
    add(chamfer4_piece_13)
    with BuildSketch(Plane(origin=(10.406619479, 8, 58.204285596), x_dir=(-0.023812127644089826, -0.9996219169112968, 0.013747938305292978), z_dir=(-0.4999999999999997, 0, -0.8660254037844389))) as chamfer4_piece_14_section:
        Polygon((CHAMFER4_SIZE * 0.999621916911, -CHAMFER4_SIZE * 0.0274958766106), (-CHAMFER4_SIZE * 0.0274958766106, -CHAMFER4_SIZE * 0.999621916911), (0, 0), align=None)
    chamfer4_piece_14 = extrude(amount=14.616858971, mode=Mode.PRIVATE)
    chamfer4_piece_14 = split(chamfer4_piece_14, bisect_by=Plane(origin=(5.430658447, 7.348778849, 50.414331727), z_dir=(0.8660254037844388, 0, 0.4999999999999998)), keep=Keep.TOP, mode=Mode.PRIVATE)
    chamfer4_piece_14 = chamfer4_piece_14 - Plane(origin=(10, 7.348778849, 50), x_dir=(0, 0, 1), z_dir=(0, 1, 0)) * Cylinder(2.25, 38, mode=Mode.PRIVATE)
    add(chamfer4_piece_14)
    with BuildSketch(Plane(origin=(17.308429485, 8, 53.75), x_dir=(0, -0.9996219169112968, 0.027495876610585623), z_dir=(-1, 0, 0))) as chamfer4_piece_15_section:
        Polygon((CHAMFER4_SIZE * 0.999621916911, -CHAMFER4_SIZE * 0.0274958766106), (-CHAMFER4_SIZE * 0.0274958766106, -CHAMFER4_SIZE * 0.999621916911), (0, 0), align=None)
    chamfer4_piece_15 = extrude(amount=14.616858971, mode=Mode.PRIVATE)
    chamfer4_piece_15 = split(chamfer4_piece_15, bisect_by=Plane(origin=(8.074151024, 7.348778849, 54.164331727), z_dir=(0.8660254037844388, 0, -0.49999999999999967)), keep=Keep.TOP, mode=Mode.PRIVATE)
    chamfer4_piece_15 = chamfer4_piece_15 - Plane(origin=(10, 7.348778849, 50), x_dir=(0, 0, 1), z_dir=(0, 1, 0)) * Cylinder(2.25, 38, mode=Mode.PRIVATE)
    add(chamfer4_piece_15)
    with BuildSketch(Plane(origin=(16.901810007, 8, 45.545714404), x_dir=(0.023812127644090925, -0.9996219169112968, 0.013747938305293602), z_dir=(-0.49999999999999944, 0, 0.866025403784439))) as chamfer4_piece_16_section:
        Polygon((CHAMFER4_SIZE * 0.999621916911, -CHAMFER4_SIZE * 0.0274958766106), (-CHAMFER4_SIZE * 0.0274958766106, -CHAMFER4_SIZE * 0.999621916911), (0, 0), align=None)
    chamfer4_piece_16 = extrude(amount=14.616858971, mode=Mode.PRIVATE)
    chamfer4_piece_16 = chamfer4_piece_16 - Plane(origin=(10, 7.348778849, 50), x_dir=(0, 0, 1), z_dir=(0, 1, 0)) * Cylinder(2.25, 38, mode=Mode.PRIVATE)
    add(chamfer4_piece_16)
    with BuildSketch(Plane(origin=(9.593380521, 8, 41.795714404), x_dir=(0.023812127644090273, -0.9996219169112968, -0.013747938305293236), z_dir=(0.49999999999999967, 0, 0.8660254037844388))) as chamfer4_piece_17_section:
        Polygon((CHAMFER4_SIZE * 0.999621916911, -CHAMFER4_SIZE * 0.0274958766106), (-CHAMFER4_SIZE * 0.0274958766106, -CHAMFER4_SIZE * 0.999621916911), (0, 0), align=None)
    chamfer4_piece_17 = extrude(amount=14.616858971, mode=Mode.PRIVATE)
    chamfer4_piece_17 = chamfer4_piece_17 - Plane(origin=(10, 7.348778849, 50), x_dir=(0, 0, 1), z_dir=(0, 1, 0)) * Cylinder(2.25, 38, mode=Mode.PRIVATE)
    add(chamfer4_piece_17)
    with BuildSketch(Plane(origin=(2.691570515, 8, 46.25), x_dir=(0, -0.9996219169112968, -0.027495876610585623), z_dir=(1, 0, 0))) as chamfer4_piece_18_section:
        Polygon((CHAMFER4_SIZE * 0.999621916911, -CHAMFER4_SIZE * 0.0274958766106), (-CHAMFER4_SIZE * 0.0274958766106, -CHAMFER4_SIZE * 0.999621916911), (0, 0), align=None)
    chamfer4_piece_18 = extrude(amount=14.616858971, mode=Mode.PRIVATE)
    chamfer4_piece_18 = split(chamfer4_piece_18, bisect_by=Plane(origin=(8.074151024, 7.348778849, 45.835668273), z_dir=(0.8660254037844388, 0, 0.4999999999999998)), keep=Keep.TOP, mode=Mode.PRIVATE)
    chamfer4_piece_18 = chamfer4_piece_18 - Plane(origin=(10, 7.348778849, 50), x_dir=(0, 0, 1), z_dir=(0, 1, 0)) * Cylinder(2.25, 38, mode=Mode.PRIVATE)
    add(chamfer4_piece_18)
    with BuildSketch(Plane(origin=(-16.901810007, 8, 54.454285596), x_dir=(-0.023812127644091113, -0.9996219169112968, -0.013747938305293738), z_dir=(0.5000000000000001, 0, -0.8660254037844387))) as chamfer4_piece_19_section:
        Polygon((CHAMFER4_SIZE * 0.999621916911, -CHAMFER4_SIZE * 0.0274958766106), (-CHAMFER4_SIZE * 0.0274958766106, -CHAMFER4_SIZE * 0.999621916911), (0, 0), align=None)
    chamfer4_piece_19 = extrude(amount=14.616858971, mode=Mode.PRIVATE)
    chamfer4_piece_19 = chamfer4_piece_19 - Plane(origin=(-10, 7.348778849, 50), x_dir=(0, 0, 1), z_dir=(0, 1, 0)) * Cylinder(2.25, 38, mode=Mode.PRIVATE)
    add(chamfer4_piece_19)
    with BuildSketch(Plane(origin=(-9.593380521, 8, 58.204285596), x_dir=(-0.023812127644089826, -0.9996219169112968, 0.013747938305292976), z_dir=(-0.4999999999999996, 0, -0.8660254037844389))) as chamfer4_piece_20_section:
        Polygon((CHAMFER4_SIZE * 0.999621916911, -CHAMFER4_SIZE * 0.0274958766106), (-CHAMFER4_SIZE * 0.0274958766106, -CHAMFER4_SIZE * 0.999621916911), (0, 0), align=None)
    chamfer4_piece_20 = extrude(amount=14.616858971, mode=Mode.PRIVATE)
    chamfer4_piece_20 = chamfer4_piece_20 - Plane(origin=(-10, 7.348778849, 50), x_dir=(0, 0, 1), z_dir=(0, 1, 0)) * Cylinder(2.25, 38, mode=Mode.PRIVATE)
    add(chamfer4_piece_20)
    with BuildSketch(Plane(origin=(-2.691570515, 8, 53.75), x_dir=(0, -0.9996219169112968, 0.027495876610585623), z_dir=(-1, 0, 0))) as chamfer4_piece_21_section:
        Polygon((CHAMFER4_SIZE * 0.999621916911, -CHAMFER4_SIZE * 0.0274958766106), (-CHAMFER4_SIZE * 0.0274958766106, -CHAMFER4_SIZE * 0.999621916911), (0, 0), align=None)
    chamfer4_piece_21 = extrude(amount=14.616858971, mode=Mode.PRIVATE)
    chamfer4_piece_21 = chamfer4_piece_21 - Plane(origin=(-10, 7.348778849, 50), x_dir=(0, 0, 1), z_dir=(0, 1, 0)) * Cylinder(2.25, 38, mode=Mode.PRIVATE)
    chamfer4_piece_21 = split(chamfer4_piece_21, bisect_by=Plane(origin=(-8.074151024, 7.348778849, 54.164331727), z_dir=(-0.866025403784439, 0, -0.49999999999999944)), keep=Keep.TOP, mode=Mode.PRIVATE)
    add(chamfer4_piece_21)
    with BuildSketch(Plane(origin=(-3.098189993, 8, 45.545714404), x_dir=(0.023812127644091286, -0.9996219169112968, 0.01374793830529381), z_dir=(-0.49999999999999944, 0, 0.866025403784439))) as chamfer4_piece_22_section:
        Polygon((CHAMFER4_SIZE * 0.999621916911, -CHAMFER4_SIZE * 0.0274958766106), (-CHAMFER4_SIZE * 0.0274958766106, -CHAMFER4_SIZE * 0.999621916911), (0, 0), align=None)
    chamfer4_piece_22 = extrude(amount=14.616858971, mode=Mode.PRIVATE)
    chamfer4_piece_22 = chamfer4_piece_22 - Plane(origin=(-10, 7.348778849, 50), x_dir=(0, 0, 1), z_dir=(0, 1, 0)) * Cylinder(2.25, 38, mode=Mode.PRIVATE)
    chamfer4_piece_22 = split(chamfer4_piece_22, bisect_by=Plane(origin=(-5.430658447, 7.348778849, 50.414331727), z_dir=(-0.8660254037844384, 0, 0.5000000000000006)), keep=Keep.TOP, mode=Mode.PRIVATE)
    add(chamfer4_piece_22)
    with BuildSketch(Plane(origin=(-10.406619479, 8, 41.795714404), x_dir=(0.02381212764408981, -0.9996219169112968, -0.013747938305293002), z_dir=(0.5000000000000006, 0, 0.8660254037844384))) as chamfer4_piece_23_section:
        Polygon((CHAMFER4_SIZE * 0.999621916911, -CHAMFER4_SIZE * 0.0274958766106), (-CHAMFER4_SIZE * 0.0274958766106, -CHAMFER4_SIZE * 0.999621916911), (0, 0), align=None)
    chamfer4_piece_23 = extrude(amount=14.616858971, mode=Mode.PRIVATE)
    chamfer4_piece_23 = chamfer4_piece_23 - Plane(origin=(-10, 7.348778849, 50), x_dir=(0, 0, 1), z_dir=(0, 1, 0)) * Cylinder(2.25, 38, mode=Mode.PRIVATE)
    chamfer4_piece_23 = split(chamfer4_piece_23, bisect_by=Plane(origin=(-5.430658447, 7.348778849, 49.585668273), z_dir=(-0.866025403784439, 0, -0.49999999999999944)), keep=Keep.TOP, mode=Mode.PRIVATE)
    add(chamfer4_piece_23)
    with BuildSketch(Plane(origin=(-17.308429485, 8, 46.25), x_dir=(0, -0.9996219169112968, -0.027495876610585623), z_dir=(1, 0, 0))) as chamfer4_piece_24_section:
        Polygon((CHAMFER4_SIZE * 0.999621916911, -CHAMFER4_SIZE * 0.0274958766106), (-CHAMFER4_SIZE * 0.0274958766106, -CHAMFER4_SIZE * 0.999621916911), (0, 0), align=None)
    chamfer4_piece_24 = extrude(amount=14.616858971, mode=Mode.PRIVATE)
    chamfer4_piece_24 = chamfer4_piece_24 - Plane(origin=(-10, 7.348778849, 50), x_dir=(0, 0, 1), z_dir=(0, 1, 0)) * Cylinder(2.25, 38, mode=Mode.PRIVATE)
    chamfer4_piece_24 = split(chamfer4_piece_24, bisect_by=Plane(origin=(-8.074151024, 7.348778849, 45.835668273), z_dir=(-0.8660254037844384, 0, 0.5000000000000006)), keep=Keep.TOP, mode=Mode.PRIVATE)
    add(chamfer4_piece_24)

    # Chamfer6
    chamfer6_edges_1 = [part.edges().sort_by_distance(p)[0] for p in [
        (-12.55, 11, 29),
    ]]
    chamfer6_side_1 = [part.faces().sort_by_distance(p)[0] for p in [
        (-12.55, 11.070020754, 29),
    ]]
    chamfer6_edges_2 = [part.edges().sort_by_distance(p)[0] for p in [
        (12.55, 11, 29),
    ]]
    chamfer6_side_2 = [part.faces().sort_by_distance(p)[0] for p in [
        (12.55, 11.070020754, 29),
    ]]
    chamfer6 = BRepFilletAPI_MakeChamfer(part.part.solid().wrapped)
    for e in chamfer6_edges_1:
        chamfer6.Add(CHAMFER6_SIZE - 0.0001, CHAMFER6_SIZE_2 - 0.0001, e.wrapped, chamfer6_side_1[0].wrapped)
    for e in chamfer6_edges_2:
        chamfer6.Add(CHAMFER6_SIZE - 0.0001, CHAMFER6_SIZE_2 - 0.0001, e.wrapped, chamfer6_side_2[0].wrapped)
    add(Compound.cast(chamfer6.Shape()), mode=Mode.REPLACE)  # a hair under: the kernel refuses the full size

    # Chamfer7
    chamfer7_edges = [part.edges().sort_by_distance(p)[0] for p in [
        (-20, 0, 29),
    ]]
    chamfer7_side = [part.faces().sort_by_distance(p)[0] for p in [
        (0, 0, 30.75649703),
    ]]
    chamfer(chamfer7_edges, length=CHAMFER7_SIZE, length2=CHAMFER7_SIZE2, reference=chamfer7_side[0])

    # Chamfer8
    chamfer8_edges = [part.edges().sort_by_distance(p)[0] for p in [
        (20, 0, 29),
    ]]
    chamfer8_side = [part.faces().sort_by_distance(p)[0] for p in [
        (2.068715144, 0, 30.958368808),
    ]]
    chamfer(chamfer8_edges, length=CHAMFER8_SIZE, length2=CHAMFER8_SIZE2, reference=chamfer8_side[0])

    # Sketch13 → Cut-Extrude10 (cut)
    with BuildSketch(Plane(origin=(0, 0, 0), x_dir=(-1, 0, 0), z_dir=(0, 0, -1))):
        Rectangle(SKETCH13_W, SKETCH13_H)
    extrude(amount=-CUT_EXTRUDE10_DEPTH, mode=Mode.SUBTRACT)


solid = part.part
